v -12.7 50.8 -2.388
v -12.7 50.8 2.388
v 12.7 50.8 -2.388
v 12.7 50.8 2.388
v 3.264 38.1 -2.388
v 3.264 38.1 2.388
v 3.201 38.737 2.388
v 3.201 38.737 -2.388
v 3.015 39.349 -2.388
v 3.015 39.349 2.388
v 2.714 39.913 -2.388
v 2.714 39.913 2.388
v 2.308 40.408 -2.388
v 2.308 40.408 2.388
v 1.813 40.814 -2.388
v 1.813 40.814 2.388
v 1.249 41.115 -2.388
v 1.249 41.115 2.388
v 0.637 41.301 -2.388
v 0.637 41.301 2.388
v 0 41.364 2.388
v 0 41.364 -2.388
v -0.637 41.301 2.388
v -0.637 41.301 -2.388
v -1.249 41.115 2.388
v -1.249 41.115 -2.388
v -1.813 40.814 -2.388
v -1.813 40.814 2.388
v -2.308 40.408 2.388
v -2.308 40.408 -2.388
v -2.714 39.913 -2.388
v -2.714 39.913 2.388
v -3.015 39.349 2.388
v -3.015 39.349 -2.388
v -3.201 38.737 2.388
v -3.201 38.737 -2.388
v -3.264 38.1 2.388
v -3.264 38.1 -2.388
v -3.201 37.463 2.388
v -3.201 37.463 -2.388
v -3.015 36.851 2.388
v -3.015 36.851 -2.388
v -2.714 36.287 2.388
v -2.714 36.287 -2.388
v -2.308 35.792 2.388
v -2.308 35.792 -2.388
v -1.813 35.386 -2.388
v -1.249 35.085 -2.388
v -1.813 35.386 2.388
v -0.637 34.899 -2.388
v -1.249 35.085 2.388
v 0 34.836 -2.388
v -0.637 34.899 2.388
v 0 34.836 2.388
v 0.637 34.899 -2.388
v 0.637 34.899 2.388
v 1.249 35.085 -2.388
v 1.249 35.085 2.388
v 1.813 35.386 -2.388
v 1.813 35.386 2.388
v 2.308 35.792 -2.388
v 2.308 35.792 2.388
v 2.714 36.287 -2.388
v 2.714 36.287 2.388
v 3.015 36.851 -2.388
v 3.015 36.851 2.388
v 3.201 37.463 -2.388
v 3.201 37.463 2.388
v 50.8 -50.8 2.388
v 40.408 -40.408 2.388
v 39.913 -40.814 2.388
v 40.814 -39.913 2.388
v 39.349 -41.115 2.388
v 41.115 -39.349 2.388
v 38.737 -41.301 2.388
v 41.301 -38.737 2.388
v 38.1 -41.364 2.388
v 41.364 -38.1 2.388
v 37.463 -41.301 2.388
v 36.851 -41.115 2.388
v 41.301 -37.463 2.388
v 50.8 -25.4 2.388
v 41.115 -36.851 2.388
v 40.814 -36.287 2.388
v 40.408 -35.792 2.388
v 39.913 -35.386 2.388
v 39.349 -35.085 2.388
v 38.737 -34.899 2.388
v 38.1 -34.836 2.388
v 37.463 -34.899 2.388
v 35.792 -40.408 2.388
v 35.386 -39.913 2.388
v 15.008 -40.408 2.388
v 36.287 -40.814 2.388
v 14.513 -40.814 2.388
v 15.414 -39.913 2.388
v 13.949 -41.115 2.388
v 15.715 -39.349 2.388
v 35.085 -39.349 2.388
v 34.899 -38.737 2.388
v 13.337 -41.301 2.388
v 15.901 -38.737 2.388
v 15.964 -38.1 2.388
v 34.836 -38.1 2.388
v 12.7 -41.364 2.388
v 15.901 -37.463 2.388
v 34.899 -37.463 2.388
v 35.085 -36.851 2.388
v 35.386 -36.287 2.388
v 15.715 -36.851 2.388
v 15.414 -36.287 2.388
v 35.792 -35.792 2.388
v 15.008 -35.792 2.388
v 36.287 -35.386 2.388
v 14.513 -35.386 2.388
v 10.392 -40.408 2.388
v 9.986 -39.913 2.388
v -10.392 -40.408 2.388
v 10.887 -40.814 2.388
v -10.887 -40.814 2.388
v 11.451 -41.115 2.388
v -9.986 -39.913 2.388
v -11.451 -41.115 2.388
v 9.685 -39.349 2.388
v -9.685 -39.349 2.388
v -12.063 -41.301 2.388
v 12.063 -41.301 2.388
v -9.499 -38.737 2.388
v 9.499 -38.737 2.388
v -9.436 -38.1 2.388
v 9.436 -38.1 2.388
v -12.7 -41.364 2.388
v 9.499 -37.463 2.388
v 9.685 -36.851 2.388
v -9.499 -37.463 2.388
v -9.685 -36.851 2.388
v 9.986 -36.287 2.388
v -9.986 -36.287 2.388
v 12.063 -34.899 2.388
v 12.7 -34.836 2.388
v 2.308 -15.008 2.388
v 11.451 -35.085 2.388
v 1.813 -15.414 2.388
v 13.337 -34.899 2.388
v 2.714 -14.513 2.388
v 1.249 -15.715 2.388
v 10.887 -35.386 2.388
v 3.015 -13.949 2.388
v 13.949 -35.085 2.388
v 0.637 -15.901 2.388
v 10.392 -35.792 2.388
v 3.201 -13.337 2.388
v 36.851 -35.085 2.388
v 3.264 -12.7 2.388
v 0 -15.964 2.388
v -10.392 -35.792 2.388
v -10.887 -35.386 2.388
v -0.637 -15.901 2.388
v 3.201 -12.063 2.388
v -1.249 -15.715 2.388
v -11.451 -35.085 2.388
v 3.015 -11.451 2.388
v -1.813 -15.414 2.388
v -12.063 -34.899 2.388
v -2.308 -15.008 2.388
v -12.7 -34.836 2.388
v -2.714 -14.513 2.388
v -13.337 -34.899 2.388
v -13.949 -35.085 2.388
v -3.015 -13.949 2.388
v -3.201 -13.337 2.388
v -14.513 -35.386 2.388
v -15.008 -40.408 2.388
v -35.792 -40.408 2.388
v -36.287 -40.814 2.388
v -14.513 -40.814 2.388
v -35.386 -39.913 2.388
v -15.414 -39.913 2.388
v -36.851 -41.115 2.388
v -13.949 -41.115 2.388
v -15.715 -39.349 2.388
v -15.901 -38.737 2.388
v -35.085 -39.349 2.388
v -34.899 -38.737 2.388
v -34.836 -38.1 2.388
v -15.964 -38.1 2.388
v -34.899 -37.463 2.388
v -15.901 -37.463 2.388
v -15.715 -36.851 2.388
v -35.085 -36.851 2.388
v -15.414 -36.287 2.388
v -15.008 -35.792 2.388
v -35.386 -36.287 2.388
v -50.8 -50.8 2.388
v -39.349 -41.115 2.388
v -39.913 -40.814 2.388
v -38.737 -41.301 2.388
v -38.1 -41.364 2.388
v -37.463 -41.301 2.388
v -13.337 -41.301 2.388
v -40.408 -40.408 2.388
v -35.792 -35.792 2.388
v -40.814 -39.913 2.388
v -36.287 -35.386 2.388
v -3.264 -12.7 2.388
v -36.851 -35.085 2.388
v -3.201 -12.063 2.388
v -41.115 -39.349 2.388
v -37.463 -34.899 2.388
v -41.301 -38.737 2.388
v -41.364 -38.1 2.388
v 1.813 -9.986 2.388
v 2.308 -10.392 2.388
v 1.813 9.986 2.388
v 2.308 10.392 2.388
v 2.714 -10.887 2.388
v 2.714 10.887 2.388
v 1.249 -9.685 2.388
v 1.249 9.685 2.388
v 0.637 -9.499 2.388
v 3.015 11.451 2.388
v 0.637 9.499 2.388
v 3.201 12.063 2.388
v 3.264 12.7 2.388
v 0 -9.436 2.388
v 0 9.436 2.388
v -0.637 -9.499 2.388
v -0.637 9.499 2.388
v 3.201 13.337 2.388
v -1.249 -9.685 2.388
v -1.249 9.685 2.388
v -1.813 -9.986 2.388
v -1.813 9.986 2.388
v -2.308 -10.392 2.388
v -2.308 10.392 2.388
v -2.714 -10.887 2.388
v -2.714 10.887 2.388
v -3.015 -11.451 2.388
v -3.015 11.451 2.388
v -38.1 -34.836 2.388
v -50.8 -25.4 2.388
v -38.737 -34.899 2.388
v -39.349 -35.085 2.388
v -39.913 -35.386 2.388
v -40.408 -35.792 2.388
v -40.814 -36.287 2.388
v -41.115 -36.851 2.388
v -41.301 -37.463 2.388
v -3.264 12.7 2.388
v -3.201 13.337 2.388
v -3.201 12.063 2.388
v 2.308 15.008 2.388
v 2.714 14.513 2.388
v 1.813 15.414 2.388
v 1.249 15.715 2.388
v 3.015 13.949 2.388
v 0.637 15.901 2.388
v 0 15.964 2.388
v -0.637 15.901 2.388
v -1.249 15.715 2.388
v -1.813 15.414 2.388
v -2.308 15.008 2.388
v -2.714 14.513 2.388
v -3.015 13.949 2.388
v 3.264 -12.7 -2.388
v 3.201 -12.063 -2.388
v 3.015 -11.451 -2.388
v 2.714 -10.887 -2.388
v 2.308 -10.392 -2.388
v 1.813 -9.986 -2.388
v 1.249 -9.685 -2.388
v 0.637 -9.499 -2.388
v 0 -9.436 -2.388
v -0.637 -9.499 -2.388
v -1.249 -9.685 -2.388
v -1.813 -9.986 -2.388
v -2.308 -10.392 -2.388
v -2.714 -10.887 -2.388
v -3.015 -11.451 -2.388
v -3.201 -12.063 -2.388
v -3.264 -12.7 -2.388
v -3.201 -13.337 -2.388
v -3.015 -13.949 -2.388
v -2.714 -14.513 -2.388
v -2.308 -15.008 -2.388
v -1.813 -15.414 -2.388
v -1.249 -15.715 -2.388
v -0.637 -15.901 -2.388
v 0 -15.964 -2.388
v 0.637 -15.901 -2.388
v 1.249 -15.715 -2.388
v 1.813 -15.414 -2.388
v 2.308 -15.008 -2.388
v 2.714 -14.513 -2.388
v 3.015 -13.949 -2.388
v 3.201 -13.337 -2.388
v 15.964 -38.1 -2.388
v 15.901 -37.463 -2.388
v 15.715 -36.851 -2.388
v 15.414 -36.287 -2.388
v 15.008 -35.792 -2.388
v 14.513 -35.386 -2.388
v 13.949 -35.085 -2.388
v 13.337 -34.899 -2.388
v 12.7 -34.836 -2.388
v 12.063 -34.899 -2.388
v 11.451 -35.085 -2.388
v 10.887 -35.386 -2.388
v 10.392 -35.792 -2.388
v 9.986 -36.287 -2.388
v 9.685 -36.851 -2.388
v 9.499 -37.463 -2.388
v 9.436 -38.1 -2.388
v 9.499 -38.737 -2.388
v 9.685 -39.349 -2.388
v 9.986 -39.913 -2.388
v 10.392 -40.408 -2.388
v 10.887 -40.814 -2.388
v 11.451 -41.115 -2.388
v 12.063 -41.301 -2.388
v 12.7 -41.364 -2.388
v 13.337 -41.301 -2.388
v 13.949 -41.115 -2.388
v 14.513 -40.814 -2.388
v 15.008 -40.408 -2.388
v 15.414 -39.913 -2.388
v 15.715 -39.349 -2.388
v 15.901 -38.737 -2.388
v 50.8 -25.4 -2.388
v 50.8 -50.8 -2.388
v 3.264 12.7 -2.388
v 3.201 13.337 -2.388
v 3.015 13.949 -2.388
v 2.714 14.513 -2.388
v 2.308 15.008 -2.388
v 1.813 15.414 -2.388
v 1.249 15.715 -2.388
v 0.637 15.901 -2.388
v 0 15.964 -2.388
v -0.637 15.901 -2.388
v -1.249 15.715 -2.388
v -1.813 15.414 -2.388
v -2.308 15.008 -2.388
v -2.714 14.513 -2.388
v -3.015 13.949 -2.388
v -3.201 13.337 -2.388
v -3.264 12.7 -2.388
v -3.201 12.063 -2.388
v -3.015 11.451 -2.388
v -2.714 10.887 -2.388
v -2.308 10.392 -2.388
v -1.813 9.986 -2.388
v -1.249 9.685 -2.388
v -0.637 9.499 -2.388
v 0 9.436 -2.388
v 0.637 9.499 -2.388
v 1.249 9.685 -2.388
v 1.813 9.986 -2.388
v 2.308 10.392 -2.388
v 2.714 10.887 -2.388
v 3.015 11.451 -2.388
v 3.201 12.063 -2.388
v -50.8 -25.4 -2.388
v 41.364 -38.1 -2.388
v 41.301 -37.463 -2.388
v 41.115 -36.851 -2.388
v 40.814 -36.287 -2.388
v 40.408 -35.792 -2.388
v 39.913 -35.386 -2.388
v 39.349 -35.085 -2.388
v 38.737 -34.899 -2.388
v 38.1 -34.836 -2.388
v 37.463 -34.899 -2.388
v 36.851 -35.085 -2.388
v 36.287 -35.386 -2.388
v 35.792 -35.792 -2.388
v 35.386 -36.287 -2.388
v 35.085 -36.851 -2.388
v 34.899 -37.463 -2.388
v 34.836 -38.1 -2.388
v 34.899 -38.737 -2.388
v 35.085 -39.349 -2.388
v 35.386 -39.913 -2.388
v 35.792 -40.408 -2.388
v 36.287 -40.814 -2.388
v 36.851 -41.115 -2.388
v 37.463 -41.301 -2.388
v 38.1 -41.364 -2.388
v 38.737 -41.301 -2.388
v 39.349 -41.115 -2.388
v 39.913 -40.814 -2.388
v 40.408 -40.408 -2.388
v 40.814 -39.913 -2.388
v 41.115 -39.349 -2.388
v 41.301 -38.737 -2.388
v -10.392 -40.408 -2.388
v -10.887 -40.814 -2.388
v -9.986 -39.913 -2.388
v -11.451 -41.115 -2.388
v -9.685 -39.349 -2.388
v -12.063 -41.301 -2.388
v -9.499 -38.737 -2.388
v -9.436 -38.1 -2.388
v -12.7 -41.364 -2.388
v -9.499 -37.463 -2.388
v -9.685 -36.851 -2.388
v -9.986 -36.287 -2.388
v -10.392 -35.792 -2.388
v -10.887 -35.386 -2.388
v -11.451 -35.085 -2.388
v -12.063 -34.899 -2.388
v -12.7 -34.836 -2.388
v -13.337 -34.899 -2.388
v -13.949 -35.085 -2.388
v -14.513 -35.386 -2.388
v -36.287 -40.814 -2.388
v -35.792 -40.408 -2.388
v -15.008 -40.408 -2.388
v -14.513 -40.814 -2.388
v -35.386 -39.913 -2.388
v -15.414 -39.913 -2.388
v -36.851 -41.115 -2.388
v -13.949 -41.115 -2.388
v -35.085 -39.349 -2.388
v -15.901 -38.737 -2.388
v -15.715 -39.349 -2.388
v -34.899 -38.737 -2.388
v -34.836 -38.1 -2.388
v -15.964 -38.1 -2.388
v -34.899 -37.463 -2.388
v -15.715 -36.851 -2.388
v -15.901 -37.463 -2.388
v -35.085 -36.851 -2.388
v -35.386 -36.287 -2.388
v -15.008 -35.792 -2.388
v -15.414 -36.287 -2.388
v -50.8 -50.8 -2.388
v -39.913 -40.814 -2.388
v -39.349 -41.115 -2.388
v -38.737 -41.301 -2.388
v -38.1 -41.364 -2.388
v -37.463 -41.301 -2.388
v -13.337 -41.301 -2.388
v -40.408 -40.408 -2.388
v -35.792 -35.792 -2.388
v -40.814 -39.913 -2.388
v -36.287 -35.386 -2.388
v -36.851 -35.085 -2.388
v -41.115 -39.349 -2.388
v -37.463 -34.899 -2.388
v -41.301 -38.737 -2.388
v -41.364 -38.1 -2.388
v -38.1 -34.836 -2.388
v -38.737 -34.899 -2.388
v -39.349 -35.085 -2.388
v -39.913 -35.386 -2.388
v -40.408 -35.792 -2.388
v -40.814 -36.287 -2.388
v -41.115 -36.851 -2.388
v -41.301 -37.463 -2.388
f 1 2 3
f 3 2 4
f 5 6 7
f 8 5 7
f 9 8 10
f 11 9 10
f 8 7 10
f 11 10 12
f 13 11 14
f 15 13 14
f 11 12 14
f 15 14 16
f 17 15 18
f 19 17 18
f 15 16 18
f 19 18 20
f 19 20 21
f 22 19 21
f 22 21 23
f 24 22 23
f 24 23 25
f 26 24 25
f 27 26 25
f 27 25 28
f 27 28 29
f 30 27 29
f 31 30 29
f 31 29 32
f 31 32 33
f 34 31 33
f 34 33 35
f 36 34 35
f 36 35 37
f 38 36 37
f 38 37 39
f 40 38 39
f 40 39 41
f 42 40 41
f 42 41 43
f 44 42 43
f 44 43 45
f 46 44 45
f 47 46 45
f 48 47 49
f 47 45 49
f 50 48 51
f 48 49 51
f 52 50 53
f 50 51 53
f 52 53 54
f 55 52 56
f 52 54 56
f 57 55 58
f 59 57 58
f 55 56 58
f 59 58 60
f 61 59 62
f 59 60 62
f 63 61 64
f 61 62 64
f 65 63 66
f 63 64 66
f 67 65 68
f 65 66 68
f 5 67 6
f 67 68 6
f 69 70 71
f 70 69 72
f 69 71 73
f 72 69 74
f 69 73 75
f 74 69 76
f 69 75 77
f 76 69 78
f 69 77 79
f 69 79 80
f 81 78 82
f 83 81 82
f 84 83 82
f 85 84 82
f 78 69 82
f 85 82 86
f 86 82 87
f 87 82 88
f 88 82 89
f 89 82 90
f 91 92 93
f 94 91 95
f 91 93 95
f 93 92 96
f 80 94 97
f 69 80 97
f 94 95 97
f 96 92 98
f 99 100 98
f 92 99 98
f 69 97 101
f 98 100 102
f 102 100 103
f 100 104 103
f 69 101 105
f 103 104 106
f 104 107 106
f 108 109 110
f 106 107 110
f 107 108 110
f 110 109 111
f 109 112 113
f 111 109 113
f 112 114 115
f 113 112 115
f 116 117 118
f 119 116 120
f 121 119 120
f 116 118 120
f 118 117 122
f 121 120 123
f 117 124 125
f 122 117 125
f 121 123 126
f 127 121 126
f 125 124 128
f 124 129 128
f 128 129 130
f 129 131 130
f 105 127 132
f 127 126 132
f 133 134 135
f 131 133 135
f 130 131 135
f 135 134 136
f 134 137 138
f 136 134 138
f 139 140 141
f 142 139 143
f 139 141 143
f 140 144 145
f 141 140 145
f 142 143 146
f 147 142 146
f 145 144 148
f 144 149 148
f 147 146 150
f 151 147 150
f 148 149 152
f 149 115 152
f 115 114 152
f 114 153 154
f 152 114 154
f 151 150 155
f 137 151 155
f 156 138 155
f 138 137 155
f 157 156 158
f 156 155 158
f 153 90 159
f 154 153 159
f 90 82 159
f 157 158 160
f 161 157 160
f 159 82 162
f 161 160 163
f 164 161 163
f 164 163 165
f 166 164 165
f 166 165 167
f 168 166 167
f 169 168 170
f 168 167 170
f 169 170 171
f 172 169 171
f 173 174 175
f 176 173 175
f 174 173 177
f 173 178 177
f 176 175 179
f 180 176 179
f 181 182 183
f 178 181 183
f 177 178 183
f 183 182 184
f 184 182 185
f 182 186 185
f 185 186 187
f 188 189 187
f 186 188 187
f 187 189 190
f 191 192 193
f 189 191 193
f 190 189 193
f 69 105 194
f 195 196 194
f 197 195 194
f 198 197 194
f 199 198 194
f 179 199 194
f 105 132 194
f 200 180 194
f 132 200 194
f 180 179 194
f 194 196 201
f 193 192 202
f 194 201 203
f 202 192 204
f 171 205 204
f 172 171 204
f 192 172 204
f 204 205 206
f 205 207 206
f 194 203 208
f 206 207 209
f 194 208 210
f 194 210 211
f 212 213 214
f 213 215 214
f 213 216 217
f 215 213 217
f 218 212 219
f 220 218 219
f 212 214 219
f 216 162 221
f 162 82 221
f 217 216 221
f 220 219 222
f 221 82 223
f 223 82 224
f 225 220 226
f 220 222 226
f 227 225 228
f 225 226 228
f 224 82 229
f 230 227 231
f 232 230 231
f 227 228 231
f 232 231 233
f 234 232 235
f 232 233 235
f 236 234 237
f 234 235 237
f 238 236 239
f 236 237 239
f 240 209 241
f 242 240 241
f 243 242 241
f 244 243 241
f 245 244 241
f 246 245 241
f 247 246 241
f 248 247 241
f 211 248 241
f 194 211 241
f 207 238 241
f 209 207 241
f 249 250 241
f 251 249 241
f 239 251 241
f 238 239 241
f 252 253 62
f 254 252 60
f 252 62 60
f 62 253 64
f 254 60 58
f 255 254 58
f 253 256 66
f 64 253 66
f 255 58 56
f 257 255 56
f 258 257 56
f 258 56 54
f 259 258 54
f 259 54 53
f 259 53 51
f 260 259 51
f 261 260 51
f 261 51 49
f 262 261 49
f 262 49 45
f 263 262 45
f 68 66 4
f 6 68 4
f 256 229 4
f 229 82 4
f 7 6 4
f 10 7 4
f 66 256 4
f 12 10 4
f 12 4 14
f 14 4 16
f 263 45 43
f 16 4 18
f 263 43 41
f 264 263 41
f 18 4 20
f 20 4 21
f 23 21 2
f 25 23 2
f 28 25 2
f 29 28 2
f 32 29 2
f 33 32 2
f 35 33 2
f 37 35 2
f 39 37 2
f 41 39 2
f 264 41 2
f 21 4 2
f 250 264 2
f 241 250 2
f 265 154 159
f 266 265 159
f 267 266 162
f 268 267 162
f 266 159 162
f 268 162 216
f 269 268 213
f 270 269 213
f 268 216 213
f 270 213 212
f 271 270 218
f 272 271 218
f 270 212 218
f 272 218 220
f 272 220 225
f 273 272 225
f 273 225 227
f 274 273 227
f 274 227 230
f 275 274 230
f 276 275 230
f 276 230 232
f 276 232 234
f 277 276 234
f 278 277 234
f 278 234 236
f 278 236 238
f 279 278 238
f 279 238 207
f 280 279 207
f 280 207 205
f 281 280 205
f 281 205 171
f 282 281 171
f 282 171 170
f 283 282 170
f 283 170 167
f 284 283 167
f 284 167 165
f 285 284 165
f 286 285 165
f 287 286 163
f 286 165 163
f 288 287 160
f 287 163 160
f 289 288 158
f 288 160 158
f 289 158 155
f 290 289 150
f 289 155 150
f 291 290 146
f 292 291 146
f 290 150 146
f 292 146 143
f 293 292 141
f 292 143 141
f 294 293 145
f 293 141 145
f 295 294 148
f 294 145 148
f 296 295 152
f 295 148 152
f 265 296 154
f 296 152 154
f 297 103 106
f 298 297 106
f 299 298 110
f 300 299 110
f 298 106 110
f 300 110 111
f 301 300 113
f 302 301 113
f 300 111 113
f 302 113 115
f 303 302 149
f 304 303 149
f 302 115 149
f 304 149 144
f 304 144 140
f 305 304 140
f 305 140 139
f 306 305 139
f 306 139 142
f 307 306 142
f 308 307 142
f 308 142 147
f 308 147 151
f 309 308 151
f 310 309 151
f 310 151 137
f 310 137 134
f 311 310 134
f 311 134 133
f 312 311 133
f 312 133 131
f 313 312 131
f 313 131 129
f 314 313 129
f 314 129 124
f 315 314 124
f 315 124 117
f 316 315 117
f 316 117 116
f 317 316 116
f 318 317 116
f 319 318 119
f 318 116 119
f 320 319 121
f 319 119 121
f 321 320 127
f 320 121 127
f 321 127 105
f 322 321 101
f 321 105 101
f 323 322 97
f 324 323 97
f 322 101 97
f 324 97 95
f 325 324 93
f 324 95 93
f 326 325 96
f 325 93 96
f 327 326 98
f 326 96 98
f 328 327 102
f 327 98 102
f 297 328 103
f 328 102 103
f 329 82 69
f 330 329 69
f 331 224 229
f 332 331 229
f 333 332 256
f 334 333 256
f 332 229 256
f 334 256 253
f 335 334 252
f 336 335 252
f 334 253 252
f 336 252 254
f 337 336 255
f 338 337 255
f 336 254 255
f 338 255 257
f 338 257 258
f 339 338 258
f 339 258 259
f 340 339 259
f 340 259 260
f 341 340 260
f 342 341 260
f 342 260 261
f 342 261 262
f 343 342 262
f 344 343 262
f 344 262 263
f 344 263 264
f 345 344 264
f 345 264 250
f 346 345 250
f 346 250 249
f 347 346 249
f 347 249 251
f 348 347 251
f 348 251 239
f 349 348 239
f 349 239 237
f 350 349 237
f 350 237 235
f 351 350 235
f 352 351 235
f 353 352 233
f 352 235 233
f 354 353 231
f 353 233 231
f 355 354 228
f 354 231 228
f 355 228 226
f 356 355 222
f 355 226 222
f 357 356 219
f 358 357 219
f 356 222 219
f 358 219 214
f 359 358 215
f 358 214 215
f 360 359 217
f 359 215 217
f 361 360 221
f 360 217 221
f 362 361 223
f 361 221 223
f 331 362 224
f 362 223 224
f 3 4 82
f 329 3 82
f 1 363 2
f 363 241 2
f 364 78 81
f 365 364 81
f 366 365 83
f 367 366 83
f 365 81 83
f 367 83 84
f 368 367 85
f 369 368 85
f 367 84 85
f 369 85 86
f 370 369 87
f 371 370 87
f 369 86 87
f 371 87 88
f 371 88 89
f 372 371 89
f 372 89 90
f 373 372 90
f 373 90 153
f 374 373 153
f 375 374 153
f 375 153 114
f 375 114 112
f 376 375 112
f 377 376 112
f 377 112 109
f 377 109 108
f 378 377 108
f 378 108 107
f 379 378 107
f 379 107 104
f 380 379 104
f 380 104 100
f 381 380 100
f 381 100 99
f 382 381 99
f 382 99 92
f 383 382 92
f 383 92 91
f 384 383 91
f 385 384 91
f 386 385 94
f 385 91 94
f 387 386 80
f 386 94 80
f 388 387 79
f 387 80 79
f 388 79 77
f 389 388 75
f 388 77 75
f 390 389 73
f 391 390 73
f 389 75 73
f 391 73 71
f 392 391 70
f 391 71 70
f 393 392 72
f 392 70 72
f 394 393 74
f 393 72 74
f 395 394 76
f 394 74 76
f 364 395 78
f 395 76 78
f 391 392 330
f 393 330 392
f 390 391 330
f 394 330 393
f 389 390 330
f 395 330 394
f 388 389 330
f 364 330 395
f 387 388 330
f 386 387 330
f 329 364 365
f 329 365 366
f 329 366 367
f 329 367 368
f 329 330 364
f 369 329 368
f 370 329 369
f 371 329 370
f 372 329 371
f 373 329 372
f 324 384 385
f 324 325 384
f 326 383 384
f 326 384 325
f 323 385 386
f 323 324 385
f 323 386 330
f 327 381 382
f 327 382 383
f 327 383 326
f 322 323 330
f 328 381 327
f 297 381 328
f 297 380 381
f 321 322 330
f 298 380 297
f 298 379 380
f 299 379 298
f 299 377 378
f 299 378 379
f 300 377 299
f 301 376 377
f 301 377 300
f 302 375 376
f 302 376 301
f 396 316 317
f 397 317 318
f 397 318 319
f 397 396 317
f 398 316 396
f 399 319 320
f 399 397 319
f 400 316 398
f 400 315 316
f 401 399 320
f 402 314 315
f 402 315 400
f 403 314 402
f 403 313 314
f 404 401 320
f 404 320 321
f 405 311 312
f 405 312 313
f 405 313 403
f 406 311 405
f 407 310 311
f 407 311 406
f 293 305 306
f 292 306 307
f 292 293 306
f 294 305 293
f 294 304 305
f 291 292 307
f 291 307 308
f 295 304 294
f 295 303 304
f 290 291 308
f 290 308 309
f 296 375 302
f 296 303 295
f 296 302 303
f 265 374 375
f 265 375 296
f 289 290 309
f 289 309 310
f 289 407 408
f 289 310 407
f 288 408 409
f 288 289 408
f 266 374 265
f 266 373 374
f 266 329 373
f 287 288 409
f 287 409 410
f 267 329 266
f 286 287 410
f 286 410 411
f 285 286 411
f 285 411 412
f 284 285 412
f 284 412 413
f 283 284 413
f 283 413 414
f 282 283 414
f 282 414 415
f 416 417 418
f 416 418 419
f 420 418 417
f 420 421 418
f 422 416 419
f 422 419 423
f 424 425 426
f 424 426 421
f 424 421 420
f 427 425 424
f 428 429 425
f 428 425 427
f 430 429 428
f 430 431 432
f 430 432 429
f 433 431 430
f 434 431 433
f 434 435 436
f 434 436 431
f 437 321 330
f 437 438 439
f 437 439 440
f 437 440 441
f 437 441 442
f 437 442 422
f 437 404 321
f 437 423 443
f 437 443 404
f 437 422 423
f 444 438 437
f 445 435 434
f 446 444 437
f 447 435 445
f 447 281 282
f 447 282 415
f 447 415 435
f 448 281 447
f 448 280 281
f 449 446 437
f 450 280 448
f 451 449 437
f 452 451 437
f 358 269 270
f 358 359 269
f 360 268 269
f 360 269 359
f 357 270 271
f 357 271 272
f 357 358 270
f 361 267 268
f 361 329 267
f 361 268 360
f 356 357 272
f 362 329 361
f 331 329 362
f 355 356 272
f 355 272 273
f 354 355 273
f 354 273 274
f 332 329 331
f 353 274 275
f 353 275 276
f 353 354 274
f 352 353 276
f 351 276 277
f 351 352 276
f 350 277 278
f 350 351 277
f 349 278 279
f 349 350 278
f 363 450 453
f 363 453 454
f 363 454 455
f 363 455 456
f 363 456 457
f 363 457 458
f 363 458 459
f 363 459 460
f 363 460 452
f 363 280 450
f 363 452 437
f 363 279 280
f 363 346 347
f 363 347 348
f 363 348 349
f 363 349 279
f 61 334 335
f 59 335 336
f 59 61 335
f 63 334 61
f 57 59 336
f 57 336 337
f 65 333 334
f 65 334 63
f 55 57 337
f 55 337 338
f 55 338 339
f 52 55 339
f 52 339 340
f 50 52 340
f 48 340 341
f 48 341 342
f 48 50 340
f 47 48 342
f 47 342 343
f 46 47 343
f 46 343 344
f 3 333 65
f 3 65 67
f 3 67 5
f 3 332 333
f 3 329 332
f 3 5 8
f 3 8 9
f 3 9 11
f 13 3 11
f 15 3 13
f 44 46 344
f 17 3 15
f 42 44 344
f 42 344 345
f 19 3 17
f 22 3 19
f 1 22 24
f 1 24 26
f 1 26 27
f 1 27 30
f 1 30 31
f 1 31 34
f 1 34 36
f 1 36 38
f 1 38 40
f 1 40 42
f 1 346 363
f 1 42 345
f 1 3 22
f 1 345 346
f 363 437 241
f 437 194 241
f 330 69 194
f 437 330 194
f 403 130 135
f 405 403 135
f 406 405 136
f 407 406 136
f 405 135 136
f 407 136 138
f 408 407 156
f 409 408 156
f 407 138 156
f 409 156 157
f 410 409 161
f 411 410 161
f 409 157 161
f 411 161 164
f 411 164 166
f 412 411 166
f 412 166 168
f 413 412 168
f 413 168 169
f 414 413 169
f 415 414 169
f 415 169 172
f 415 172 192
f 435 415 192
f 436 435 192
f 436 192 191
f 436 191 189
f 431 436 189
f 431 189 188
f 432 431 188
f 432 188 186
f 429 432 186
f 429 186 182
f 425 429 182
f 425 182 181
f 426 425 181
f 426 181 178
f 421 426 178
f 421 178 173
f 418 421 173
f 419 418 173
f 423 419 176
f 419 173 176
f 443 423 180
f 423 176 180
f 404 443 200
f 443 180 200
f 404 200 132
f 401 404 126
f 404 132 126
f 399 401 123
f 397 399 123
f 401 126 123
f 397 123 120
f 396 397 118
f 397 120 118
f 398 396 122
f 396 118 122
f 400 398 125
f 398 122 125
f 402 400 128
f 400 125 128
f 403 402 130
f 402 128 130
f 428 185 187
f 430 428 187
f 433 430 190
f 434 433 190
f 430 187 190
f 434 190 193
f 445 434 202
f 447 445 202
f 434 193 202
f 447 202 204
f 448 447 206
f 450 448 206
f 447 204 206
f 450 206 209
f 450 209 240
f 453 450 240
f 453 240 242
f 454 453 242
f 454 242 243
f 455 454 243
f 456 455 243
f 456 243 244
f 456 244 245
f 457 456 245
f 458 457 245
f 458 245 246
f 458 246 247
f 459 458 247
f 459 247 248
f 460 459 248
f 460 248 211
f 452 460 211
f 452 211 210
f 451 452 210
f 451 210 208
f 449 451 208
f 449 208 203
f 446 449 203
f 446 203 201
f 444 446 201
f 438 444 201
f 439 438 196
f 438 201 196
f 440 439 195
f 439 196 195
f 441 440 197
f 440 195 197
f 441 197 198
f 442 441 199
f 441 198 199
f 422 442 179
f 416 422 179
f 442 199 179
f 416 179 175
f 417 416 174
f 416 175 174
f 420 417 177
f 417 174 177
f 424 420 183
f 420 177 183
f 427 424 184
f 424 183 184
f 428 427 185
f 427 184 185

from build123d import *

# Parameters (mm, degrees)
BOSS_EXTRUDE1_DEPTH      = 2.3876
BOSS_EXTRUDE1_DEPTH_BACK = 2.3876
SKETCH4_R                = 3.2639
CUT_EXTRUDE1_DEPTH       = 5.7752


with BuildPart() as part:
    # Sketch3 → Boss-Extrude1 (new body, two sides)
    with BuildSketch(Plane.XY) as boss_extrude1_sk:
        Polygon((50.8, -50.8), (-50.8, -50.8), (-50.8, -25.4), (-12.7, 50.8), (12.7, 50.8), (50.8, -25.4), align=None)
    extrude(amount=BOSS_EXTRUDE1_DEPTH)
    extrude(boss_extrude1_sk.sketch, amount=-BOSS_EXTRUDE1_DEPTH_BACK)

    # Sketch4 → Cut-Extrude1 (cut, through all)
    with BuildSketch(Plane.XY.offset(2.3876)):
        with Locations((-38.1, -38.1)):
            Circle(SKETCH4_R)
        with Locations((-12.7, -38.1)):
            Circle(SKETCH4_R)
        with Locations((12.7, -38.1)):
            Circle(SKETCH4_R)
        with Locations((0, 38.1)):
            Circle(SKETCH4_R)
        with Locations((0, 12.7)):
            Circle(SKETCH4_R)
        with Locations((38.1, -38.1)):
            Circle(SKETCH4_R)
        with Locations((0, -12.7)):
            Circle(SKETCH4_R)
    extrude(amount=-CUT_EXTRUDE1_DEPTH, mode=Mode.SUBTRACT)


solid = part.part
